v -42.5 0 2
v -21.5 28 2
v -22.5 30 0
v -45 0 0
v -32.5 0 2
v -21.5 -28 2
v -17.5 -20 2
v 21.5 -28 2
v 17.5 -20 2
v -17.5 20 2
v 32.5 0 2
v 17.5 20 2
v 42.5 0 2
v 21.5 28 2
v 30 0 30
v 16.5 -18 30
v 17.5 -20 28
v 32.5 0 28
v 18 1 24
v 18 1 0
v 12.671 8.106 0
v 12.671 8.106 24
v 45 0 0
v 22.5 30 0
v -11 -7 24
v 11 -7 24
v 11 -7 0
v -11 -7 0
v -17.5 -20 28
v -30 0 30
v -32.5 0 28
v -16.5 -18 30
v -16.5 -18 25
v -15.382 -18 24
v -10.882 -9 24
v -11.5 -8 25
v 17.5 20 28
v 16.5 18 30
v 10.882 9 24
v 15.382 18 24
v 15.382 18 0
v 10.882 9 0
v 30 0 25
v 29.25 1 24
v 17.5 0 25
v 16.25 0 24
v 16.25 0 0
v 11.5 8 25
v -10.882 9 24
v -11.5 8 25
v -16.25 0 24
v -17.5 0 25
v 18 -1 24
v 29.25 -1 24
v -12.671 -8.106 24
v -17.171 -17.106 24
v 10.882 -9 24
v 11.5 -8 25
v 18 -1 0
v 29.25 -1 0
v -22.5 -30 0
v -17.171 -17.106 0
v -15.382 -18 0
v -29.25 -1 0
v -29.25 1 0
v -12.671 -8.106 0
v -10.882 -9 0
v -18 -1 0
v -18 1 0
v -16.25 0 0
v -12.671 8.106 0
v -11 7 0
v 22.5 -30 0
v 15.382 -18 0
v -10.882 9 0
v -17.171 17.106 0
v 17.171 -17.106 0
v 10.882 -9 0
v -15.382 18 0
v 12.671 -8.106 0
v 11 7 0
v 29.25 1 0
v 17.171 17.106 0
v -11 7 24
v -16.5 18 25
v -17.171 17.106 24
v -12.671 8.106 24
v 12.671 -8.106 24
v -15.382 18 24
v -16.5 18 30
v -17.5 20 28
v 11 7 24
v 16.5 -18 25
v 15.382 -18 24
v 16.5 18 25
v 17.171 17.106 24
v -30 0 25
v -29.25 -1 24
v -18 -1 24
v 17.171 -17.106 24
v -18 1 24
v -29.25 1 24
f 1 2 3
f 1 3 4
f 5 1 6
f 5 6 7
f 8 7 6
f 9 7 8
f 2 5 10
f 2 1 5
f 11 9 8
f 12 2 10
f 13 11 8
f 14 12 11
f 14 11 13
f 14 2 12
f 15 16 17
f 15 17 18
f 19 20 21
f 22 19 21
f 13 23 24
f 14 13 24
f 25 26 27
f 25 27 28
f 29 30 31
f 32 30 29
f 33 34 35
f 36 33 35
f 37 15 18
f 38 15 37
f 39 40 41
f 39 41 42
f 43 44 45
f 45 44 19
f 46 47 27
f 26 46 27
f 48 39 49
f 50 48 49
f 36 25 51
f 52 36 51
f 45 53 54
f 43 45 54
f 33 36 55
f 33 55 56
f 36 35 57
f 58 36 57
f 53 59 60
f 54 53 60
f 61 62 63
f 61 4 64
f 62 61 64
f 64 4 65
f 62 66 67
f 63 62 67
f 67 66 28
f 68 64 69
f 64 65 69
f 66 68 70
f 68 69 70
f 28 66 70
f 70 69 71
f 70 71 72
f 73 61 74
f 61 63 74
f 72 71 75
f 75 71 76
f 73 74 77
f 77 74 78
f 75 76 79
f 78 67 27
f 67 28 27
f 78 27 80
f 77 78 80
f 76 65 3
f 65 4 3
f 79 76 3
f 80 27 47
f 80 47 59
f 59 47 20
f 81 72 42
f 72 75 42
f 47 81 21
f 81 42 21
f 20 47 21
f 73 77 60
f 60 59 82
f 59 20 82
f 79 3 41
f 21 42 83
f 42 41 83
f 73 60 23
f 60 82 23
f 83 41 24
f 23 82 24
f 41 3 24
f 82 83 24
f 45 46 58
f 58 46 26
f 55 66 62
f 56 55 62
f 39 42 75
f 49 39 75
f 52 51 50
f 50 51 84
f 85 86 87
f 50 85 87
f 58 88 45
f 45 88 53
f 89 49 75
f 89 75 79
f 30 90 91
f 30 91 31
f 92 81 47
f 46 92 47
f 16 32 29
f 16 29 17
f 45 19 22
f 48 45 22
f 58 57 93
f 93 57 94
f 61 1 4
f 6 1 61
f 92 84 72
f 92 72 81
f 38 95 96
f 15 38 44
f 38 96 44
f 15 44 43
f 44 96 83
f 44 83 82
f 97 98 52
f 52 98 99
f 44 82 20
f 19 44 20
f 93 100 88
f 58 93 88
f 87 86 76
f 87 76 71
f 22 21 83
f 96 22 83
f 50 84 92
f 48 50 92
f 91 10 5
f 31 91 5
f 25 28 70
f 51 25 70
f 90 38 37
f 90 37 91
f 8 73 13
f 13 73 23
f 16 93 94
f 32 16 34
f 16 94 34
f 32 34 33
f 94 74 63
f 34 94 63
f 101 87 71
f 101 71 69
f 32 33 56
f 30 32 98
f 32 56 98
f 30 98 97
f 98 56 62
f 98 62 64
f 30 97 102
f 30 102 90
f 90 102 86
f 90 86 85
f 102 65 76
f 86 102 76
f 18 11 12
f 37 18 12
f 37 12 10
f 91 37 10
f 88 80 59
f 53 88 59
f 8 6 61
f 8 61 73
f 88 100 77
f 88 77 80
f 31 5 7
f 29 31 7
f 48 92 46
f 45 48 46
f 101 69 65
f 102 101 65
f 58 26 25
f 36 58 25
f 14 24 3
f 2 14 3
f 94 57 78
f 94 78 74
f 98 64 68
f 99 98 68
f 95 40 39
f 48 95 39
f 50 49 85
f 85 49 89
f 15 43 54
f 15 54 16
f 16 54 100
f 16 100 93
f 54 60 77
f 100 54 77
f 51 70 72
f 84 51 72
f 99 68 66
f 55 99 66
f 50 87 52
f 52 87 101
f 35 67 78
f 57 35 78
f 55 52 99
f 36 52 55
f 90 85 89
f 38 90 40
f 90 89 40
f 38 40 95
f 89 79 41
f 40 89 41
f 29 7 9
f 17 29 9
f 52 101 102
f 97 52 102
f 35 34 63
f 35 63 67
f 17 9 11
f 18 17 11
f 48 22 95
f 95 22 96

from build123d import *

# Parameters (mm, degrees)
F1_DEPTH = 30
F2_DEPTH = 2
F3_SIZE  = 1.99999
F5_DEPTH = 25
F6_SIZE  = 0.99999


# Not quite as in the source:
# - a fillet or chamfer is up to 0.001 mm smaller than in the source, because OpenCascade refuses the exact size


with BuildPart() as f1:
    # F0 (on Top) → F1 (new body)
    with BuildSketch(Plane.XY):
        Polygon((17.5, 20), (-17.5, 20), (-32.5, 0), (-17.5, -20), (17.5, -20), (32.5, 0), align=None)
        Polygon((16.5, -18), (-16.5, -18), (-30, 0), (-16.5, 18), (16.5, 18), (30, 0), align=None, mode=Mode.SUBTRACT)
    extrude(amount=F1_DEPTH)

    # F0 (on Top) → F2 (join)
    with BuildSketch(Plane.XY):
        Polygon((-45, 0), (-22.5, -30), (22.5, -30), (45, 0), (22.5, 30), (-22.5, 30), align=None)
        Polygon((-32.5, 0), (-17.5, 20), (17.5, 20), (32.5, 0), (17.5, -20), (-17.5, -20), align=None, mode=Mode.SUBTRACT)
    extrude(amount=F2_DEPTH)

    # F3 (size 2 in the source; OpenCascade refuses exactly that, so slightly less here)
    f3_edges = [f1.edges().sort_by_distance(p)[0] for p in [
        (-25, 10, 30),
        (0, 20, 30),
        (25, 10, 30),
        (25, -10, 30),
        (0, -20, 30),
        (-25, -10, 30),
        (0, -30, 2),
        (33.75, -15, 2),
        (33.75, 15, 2),
        (-33.75, -15, 2),
        (-33.75, 15, 2),
        (0, 30, 2),
    ]]
    chamfer(f3_edges, length=F3_SIZE)

    # F4 (on Top) → F5 (join)
    with BuildSketch(Plane.XY):
        Polygon((-17.1708203932, -17.105572809), (-16.5, -18), (-15.3819660113, -18), (-10.8819660113, -9), (10.8819660113, -9), (15.3819660113, -18), (16.5, -18), (17.1708203932, -17.105572809), (12.6708203932, -8.105572809), (18, -1), (29.25, -1), (30, 0), (29.25, 1), (18, 1), (12.6708203932, 8.105572809), (17.1708203932, 17.105572809), (16.5, 18), (15.3819660113, 18), (10.8819660113, 9), (-10.8819660113, 9), (-15.3819660113, 18), (-16.5, 18), (-17.1708203932, 17.105572809), (-12.6708203932, 8.105572809), (-18, 1), (-29.25, 1), (-30, 0), (-29.25, -1), (-18, -1), (-12.6708203932, -8.105572809), align=None)
        Polygon((-11, -7), (-16.25, 0), (-11, 7), (11, 7), (16.25, 0), (11, -7), align=None, mode=Mode.SUBTRACT)
    extrude(amount=F5_DEPTH)

    # F6 (size 1 in the source; OpenCascade refuses exactly that, so slightly less here)
    f6_edges = [f1.edges().sort_by_distance(p)[0] for p in [
        (-23.625, -1, 25),
        (-23.625, 1, 25),
        (-15.33541, -4.552786, 25),
        (-13.625, -3.5, 25),
        (-13.625, 3.5, 25),
        (-15.33541, 4.552786, 25),
        (-14.92082, 12.605573, 25),
        (-13.131966, 13.5, 25),
        (0, 7, 25),
        (0, 9, 25),
        (0, -9, 25),
        (0, -7, 25),
        (-13.131966, -13.5, 25),
        (-14.92082, -12.605573, 25),
        (14.92082, -12.605573, 25),
        (13.131966, -13.5, 25),
        (15.33541, -4.552786, 25),
        (13.625, -3.5, 25),
        (23.625, -1, 25),
        (23.625, 1, 25),
        (15.33541, 4.552786, 25),
        (13.625, 3.5, 25),
        (14.92082, 12.605573, 25),
        (13.131966, 13.5, 25),
    ]]
    chamfer(f6_edges, length=F6_SIZE)


solid = f1.part
